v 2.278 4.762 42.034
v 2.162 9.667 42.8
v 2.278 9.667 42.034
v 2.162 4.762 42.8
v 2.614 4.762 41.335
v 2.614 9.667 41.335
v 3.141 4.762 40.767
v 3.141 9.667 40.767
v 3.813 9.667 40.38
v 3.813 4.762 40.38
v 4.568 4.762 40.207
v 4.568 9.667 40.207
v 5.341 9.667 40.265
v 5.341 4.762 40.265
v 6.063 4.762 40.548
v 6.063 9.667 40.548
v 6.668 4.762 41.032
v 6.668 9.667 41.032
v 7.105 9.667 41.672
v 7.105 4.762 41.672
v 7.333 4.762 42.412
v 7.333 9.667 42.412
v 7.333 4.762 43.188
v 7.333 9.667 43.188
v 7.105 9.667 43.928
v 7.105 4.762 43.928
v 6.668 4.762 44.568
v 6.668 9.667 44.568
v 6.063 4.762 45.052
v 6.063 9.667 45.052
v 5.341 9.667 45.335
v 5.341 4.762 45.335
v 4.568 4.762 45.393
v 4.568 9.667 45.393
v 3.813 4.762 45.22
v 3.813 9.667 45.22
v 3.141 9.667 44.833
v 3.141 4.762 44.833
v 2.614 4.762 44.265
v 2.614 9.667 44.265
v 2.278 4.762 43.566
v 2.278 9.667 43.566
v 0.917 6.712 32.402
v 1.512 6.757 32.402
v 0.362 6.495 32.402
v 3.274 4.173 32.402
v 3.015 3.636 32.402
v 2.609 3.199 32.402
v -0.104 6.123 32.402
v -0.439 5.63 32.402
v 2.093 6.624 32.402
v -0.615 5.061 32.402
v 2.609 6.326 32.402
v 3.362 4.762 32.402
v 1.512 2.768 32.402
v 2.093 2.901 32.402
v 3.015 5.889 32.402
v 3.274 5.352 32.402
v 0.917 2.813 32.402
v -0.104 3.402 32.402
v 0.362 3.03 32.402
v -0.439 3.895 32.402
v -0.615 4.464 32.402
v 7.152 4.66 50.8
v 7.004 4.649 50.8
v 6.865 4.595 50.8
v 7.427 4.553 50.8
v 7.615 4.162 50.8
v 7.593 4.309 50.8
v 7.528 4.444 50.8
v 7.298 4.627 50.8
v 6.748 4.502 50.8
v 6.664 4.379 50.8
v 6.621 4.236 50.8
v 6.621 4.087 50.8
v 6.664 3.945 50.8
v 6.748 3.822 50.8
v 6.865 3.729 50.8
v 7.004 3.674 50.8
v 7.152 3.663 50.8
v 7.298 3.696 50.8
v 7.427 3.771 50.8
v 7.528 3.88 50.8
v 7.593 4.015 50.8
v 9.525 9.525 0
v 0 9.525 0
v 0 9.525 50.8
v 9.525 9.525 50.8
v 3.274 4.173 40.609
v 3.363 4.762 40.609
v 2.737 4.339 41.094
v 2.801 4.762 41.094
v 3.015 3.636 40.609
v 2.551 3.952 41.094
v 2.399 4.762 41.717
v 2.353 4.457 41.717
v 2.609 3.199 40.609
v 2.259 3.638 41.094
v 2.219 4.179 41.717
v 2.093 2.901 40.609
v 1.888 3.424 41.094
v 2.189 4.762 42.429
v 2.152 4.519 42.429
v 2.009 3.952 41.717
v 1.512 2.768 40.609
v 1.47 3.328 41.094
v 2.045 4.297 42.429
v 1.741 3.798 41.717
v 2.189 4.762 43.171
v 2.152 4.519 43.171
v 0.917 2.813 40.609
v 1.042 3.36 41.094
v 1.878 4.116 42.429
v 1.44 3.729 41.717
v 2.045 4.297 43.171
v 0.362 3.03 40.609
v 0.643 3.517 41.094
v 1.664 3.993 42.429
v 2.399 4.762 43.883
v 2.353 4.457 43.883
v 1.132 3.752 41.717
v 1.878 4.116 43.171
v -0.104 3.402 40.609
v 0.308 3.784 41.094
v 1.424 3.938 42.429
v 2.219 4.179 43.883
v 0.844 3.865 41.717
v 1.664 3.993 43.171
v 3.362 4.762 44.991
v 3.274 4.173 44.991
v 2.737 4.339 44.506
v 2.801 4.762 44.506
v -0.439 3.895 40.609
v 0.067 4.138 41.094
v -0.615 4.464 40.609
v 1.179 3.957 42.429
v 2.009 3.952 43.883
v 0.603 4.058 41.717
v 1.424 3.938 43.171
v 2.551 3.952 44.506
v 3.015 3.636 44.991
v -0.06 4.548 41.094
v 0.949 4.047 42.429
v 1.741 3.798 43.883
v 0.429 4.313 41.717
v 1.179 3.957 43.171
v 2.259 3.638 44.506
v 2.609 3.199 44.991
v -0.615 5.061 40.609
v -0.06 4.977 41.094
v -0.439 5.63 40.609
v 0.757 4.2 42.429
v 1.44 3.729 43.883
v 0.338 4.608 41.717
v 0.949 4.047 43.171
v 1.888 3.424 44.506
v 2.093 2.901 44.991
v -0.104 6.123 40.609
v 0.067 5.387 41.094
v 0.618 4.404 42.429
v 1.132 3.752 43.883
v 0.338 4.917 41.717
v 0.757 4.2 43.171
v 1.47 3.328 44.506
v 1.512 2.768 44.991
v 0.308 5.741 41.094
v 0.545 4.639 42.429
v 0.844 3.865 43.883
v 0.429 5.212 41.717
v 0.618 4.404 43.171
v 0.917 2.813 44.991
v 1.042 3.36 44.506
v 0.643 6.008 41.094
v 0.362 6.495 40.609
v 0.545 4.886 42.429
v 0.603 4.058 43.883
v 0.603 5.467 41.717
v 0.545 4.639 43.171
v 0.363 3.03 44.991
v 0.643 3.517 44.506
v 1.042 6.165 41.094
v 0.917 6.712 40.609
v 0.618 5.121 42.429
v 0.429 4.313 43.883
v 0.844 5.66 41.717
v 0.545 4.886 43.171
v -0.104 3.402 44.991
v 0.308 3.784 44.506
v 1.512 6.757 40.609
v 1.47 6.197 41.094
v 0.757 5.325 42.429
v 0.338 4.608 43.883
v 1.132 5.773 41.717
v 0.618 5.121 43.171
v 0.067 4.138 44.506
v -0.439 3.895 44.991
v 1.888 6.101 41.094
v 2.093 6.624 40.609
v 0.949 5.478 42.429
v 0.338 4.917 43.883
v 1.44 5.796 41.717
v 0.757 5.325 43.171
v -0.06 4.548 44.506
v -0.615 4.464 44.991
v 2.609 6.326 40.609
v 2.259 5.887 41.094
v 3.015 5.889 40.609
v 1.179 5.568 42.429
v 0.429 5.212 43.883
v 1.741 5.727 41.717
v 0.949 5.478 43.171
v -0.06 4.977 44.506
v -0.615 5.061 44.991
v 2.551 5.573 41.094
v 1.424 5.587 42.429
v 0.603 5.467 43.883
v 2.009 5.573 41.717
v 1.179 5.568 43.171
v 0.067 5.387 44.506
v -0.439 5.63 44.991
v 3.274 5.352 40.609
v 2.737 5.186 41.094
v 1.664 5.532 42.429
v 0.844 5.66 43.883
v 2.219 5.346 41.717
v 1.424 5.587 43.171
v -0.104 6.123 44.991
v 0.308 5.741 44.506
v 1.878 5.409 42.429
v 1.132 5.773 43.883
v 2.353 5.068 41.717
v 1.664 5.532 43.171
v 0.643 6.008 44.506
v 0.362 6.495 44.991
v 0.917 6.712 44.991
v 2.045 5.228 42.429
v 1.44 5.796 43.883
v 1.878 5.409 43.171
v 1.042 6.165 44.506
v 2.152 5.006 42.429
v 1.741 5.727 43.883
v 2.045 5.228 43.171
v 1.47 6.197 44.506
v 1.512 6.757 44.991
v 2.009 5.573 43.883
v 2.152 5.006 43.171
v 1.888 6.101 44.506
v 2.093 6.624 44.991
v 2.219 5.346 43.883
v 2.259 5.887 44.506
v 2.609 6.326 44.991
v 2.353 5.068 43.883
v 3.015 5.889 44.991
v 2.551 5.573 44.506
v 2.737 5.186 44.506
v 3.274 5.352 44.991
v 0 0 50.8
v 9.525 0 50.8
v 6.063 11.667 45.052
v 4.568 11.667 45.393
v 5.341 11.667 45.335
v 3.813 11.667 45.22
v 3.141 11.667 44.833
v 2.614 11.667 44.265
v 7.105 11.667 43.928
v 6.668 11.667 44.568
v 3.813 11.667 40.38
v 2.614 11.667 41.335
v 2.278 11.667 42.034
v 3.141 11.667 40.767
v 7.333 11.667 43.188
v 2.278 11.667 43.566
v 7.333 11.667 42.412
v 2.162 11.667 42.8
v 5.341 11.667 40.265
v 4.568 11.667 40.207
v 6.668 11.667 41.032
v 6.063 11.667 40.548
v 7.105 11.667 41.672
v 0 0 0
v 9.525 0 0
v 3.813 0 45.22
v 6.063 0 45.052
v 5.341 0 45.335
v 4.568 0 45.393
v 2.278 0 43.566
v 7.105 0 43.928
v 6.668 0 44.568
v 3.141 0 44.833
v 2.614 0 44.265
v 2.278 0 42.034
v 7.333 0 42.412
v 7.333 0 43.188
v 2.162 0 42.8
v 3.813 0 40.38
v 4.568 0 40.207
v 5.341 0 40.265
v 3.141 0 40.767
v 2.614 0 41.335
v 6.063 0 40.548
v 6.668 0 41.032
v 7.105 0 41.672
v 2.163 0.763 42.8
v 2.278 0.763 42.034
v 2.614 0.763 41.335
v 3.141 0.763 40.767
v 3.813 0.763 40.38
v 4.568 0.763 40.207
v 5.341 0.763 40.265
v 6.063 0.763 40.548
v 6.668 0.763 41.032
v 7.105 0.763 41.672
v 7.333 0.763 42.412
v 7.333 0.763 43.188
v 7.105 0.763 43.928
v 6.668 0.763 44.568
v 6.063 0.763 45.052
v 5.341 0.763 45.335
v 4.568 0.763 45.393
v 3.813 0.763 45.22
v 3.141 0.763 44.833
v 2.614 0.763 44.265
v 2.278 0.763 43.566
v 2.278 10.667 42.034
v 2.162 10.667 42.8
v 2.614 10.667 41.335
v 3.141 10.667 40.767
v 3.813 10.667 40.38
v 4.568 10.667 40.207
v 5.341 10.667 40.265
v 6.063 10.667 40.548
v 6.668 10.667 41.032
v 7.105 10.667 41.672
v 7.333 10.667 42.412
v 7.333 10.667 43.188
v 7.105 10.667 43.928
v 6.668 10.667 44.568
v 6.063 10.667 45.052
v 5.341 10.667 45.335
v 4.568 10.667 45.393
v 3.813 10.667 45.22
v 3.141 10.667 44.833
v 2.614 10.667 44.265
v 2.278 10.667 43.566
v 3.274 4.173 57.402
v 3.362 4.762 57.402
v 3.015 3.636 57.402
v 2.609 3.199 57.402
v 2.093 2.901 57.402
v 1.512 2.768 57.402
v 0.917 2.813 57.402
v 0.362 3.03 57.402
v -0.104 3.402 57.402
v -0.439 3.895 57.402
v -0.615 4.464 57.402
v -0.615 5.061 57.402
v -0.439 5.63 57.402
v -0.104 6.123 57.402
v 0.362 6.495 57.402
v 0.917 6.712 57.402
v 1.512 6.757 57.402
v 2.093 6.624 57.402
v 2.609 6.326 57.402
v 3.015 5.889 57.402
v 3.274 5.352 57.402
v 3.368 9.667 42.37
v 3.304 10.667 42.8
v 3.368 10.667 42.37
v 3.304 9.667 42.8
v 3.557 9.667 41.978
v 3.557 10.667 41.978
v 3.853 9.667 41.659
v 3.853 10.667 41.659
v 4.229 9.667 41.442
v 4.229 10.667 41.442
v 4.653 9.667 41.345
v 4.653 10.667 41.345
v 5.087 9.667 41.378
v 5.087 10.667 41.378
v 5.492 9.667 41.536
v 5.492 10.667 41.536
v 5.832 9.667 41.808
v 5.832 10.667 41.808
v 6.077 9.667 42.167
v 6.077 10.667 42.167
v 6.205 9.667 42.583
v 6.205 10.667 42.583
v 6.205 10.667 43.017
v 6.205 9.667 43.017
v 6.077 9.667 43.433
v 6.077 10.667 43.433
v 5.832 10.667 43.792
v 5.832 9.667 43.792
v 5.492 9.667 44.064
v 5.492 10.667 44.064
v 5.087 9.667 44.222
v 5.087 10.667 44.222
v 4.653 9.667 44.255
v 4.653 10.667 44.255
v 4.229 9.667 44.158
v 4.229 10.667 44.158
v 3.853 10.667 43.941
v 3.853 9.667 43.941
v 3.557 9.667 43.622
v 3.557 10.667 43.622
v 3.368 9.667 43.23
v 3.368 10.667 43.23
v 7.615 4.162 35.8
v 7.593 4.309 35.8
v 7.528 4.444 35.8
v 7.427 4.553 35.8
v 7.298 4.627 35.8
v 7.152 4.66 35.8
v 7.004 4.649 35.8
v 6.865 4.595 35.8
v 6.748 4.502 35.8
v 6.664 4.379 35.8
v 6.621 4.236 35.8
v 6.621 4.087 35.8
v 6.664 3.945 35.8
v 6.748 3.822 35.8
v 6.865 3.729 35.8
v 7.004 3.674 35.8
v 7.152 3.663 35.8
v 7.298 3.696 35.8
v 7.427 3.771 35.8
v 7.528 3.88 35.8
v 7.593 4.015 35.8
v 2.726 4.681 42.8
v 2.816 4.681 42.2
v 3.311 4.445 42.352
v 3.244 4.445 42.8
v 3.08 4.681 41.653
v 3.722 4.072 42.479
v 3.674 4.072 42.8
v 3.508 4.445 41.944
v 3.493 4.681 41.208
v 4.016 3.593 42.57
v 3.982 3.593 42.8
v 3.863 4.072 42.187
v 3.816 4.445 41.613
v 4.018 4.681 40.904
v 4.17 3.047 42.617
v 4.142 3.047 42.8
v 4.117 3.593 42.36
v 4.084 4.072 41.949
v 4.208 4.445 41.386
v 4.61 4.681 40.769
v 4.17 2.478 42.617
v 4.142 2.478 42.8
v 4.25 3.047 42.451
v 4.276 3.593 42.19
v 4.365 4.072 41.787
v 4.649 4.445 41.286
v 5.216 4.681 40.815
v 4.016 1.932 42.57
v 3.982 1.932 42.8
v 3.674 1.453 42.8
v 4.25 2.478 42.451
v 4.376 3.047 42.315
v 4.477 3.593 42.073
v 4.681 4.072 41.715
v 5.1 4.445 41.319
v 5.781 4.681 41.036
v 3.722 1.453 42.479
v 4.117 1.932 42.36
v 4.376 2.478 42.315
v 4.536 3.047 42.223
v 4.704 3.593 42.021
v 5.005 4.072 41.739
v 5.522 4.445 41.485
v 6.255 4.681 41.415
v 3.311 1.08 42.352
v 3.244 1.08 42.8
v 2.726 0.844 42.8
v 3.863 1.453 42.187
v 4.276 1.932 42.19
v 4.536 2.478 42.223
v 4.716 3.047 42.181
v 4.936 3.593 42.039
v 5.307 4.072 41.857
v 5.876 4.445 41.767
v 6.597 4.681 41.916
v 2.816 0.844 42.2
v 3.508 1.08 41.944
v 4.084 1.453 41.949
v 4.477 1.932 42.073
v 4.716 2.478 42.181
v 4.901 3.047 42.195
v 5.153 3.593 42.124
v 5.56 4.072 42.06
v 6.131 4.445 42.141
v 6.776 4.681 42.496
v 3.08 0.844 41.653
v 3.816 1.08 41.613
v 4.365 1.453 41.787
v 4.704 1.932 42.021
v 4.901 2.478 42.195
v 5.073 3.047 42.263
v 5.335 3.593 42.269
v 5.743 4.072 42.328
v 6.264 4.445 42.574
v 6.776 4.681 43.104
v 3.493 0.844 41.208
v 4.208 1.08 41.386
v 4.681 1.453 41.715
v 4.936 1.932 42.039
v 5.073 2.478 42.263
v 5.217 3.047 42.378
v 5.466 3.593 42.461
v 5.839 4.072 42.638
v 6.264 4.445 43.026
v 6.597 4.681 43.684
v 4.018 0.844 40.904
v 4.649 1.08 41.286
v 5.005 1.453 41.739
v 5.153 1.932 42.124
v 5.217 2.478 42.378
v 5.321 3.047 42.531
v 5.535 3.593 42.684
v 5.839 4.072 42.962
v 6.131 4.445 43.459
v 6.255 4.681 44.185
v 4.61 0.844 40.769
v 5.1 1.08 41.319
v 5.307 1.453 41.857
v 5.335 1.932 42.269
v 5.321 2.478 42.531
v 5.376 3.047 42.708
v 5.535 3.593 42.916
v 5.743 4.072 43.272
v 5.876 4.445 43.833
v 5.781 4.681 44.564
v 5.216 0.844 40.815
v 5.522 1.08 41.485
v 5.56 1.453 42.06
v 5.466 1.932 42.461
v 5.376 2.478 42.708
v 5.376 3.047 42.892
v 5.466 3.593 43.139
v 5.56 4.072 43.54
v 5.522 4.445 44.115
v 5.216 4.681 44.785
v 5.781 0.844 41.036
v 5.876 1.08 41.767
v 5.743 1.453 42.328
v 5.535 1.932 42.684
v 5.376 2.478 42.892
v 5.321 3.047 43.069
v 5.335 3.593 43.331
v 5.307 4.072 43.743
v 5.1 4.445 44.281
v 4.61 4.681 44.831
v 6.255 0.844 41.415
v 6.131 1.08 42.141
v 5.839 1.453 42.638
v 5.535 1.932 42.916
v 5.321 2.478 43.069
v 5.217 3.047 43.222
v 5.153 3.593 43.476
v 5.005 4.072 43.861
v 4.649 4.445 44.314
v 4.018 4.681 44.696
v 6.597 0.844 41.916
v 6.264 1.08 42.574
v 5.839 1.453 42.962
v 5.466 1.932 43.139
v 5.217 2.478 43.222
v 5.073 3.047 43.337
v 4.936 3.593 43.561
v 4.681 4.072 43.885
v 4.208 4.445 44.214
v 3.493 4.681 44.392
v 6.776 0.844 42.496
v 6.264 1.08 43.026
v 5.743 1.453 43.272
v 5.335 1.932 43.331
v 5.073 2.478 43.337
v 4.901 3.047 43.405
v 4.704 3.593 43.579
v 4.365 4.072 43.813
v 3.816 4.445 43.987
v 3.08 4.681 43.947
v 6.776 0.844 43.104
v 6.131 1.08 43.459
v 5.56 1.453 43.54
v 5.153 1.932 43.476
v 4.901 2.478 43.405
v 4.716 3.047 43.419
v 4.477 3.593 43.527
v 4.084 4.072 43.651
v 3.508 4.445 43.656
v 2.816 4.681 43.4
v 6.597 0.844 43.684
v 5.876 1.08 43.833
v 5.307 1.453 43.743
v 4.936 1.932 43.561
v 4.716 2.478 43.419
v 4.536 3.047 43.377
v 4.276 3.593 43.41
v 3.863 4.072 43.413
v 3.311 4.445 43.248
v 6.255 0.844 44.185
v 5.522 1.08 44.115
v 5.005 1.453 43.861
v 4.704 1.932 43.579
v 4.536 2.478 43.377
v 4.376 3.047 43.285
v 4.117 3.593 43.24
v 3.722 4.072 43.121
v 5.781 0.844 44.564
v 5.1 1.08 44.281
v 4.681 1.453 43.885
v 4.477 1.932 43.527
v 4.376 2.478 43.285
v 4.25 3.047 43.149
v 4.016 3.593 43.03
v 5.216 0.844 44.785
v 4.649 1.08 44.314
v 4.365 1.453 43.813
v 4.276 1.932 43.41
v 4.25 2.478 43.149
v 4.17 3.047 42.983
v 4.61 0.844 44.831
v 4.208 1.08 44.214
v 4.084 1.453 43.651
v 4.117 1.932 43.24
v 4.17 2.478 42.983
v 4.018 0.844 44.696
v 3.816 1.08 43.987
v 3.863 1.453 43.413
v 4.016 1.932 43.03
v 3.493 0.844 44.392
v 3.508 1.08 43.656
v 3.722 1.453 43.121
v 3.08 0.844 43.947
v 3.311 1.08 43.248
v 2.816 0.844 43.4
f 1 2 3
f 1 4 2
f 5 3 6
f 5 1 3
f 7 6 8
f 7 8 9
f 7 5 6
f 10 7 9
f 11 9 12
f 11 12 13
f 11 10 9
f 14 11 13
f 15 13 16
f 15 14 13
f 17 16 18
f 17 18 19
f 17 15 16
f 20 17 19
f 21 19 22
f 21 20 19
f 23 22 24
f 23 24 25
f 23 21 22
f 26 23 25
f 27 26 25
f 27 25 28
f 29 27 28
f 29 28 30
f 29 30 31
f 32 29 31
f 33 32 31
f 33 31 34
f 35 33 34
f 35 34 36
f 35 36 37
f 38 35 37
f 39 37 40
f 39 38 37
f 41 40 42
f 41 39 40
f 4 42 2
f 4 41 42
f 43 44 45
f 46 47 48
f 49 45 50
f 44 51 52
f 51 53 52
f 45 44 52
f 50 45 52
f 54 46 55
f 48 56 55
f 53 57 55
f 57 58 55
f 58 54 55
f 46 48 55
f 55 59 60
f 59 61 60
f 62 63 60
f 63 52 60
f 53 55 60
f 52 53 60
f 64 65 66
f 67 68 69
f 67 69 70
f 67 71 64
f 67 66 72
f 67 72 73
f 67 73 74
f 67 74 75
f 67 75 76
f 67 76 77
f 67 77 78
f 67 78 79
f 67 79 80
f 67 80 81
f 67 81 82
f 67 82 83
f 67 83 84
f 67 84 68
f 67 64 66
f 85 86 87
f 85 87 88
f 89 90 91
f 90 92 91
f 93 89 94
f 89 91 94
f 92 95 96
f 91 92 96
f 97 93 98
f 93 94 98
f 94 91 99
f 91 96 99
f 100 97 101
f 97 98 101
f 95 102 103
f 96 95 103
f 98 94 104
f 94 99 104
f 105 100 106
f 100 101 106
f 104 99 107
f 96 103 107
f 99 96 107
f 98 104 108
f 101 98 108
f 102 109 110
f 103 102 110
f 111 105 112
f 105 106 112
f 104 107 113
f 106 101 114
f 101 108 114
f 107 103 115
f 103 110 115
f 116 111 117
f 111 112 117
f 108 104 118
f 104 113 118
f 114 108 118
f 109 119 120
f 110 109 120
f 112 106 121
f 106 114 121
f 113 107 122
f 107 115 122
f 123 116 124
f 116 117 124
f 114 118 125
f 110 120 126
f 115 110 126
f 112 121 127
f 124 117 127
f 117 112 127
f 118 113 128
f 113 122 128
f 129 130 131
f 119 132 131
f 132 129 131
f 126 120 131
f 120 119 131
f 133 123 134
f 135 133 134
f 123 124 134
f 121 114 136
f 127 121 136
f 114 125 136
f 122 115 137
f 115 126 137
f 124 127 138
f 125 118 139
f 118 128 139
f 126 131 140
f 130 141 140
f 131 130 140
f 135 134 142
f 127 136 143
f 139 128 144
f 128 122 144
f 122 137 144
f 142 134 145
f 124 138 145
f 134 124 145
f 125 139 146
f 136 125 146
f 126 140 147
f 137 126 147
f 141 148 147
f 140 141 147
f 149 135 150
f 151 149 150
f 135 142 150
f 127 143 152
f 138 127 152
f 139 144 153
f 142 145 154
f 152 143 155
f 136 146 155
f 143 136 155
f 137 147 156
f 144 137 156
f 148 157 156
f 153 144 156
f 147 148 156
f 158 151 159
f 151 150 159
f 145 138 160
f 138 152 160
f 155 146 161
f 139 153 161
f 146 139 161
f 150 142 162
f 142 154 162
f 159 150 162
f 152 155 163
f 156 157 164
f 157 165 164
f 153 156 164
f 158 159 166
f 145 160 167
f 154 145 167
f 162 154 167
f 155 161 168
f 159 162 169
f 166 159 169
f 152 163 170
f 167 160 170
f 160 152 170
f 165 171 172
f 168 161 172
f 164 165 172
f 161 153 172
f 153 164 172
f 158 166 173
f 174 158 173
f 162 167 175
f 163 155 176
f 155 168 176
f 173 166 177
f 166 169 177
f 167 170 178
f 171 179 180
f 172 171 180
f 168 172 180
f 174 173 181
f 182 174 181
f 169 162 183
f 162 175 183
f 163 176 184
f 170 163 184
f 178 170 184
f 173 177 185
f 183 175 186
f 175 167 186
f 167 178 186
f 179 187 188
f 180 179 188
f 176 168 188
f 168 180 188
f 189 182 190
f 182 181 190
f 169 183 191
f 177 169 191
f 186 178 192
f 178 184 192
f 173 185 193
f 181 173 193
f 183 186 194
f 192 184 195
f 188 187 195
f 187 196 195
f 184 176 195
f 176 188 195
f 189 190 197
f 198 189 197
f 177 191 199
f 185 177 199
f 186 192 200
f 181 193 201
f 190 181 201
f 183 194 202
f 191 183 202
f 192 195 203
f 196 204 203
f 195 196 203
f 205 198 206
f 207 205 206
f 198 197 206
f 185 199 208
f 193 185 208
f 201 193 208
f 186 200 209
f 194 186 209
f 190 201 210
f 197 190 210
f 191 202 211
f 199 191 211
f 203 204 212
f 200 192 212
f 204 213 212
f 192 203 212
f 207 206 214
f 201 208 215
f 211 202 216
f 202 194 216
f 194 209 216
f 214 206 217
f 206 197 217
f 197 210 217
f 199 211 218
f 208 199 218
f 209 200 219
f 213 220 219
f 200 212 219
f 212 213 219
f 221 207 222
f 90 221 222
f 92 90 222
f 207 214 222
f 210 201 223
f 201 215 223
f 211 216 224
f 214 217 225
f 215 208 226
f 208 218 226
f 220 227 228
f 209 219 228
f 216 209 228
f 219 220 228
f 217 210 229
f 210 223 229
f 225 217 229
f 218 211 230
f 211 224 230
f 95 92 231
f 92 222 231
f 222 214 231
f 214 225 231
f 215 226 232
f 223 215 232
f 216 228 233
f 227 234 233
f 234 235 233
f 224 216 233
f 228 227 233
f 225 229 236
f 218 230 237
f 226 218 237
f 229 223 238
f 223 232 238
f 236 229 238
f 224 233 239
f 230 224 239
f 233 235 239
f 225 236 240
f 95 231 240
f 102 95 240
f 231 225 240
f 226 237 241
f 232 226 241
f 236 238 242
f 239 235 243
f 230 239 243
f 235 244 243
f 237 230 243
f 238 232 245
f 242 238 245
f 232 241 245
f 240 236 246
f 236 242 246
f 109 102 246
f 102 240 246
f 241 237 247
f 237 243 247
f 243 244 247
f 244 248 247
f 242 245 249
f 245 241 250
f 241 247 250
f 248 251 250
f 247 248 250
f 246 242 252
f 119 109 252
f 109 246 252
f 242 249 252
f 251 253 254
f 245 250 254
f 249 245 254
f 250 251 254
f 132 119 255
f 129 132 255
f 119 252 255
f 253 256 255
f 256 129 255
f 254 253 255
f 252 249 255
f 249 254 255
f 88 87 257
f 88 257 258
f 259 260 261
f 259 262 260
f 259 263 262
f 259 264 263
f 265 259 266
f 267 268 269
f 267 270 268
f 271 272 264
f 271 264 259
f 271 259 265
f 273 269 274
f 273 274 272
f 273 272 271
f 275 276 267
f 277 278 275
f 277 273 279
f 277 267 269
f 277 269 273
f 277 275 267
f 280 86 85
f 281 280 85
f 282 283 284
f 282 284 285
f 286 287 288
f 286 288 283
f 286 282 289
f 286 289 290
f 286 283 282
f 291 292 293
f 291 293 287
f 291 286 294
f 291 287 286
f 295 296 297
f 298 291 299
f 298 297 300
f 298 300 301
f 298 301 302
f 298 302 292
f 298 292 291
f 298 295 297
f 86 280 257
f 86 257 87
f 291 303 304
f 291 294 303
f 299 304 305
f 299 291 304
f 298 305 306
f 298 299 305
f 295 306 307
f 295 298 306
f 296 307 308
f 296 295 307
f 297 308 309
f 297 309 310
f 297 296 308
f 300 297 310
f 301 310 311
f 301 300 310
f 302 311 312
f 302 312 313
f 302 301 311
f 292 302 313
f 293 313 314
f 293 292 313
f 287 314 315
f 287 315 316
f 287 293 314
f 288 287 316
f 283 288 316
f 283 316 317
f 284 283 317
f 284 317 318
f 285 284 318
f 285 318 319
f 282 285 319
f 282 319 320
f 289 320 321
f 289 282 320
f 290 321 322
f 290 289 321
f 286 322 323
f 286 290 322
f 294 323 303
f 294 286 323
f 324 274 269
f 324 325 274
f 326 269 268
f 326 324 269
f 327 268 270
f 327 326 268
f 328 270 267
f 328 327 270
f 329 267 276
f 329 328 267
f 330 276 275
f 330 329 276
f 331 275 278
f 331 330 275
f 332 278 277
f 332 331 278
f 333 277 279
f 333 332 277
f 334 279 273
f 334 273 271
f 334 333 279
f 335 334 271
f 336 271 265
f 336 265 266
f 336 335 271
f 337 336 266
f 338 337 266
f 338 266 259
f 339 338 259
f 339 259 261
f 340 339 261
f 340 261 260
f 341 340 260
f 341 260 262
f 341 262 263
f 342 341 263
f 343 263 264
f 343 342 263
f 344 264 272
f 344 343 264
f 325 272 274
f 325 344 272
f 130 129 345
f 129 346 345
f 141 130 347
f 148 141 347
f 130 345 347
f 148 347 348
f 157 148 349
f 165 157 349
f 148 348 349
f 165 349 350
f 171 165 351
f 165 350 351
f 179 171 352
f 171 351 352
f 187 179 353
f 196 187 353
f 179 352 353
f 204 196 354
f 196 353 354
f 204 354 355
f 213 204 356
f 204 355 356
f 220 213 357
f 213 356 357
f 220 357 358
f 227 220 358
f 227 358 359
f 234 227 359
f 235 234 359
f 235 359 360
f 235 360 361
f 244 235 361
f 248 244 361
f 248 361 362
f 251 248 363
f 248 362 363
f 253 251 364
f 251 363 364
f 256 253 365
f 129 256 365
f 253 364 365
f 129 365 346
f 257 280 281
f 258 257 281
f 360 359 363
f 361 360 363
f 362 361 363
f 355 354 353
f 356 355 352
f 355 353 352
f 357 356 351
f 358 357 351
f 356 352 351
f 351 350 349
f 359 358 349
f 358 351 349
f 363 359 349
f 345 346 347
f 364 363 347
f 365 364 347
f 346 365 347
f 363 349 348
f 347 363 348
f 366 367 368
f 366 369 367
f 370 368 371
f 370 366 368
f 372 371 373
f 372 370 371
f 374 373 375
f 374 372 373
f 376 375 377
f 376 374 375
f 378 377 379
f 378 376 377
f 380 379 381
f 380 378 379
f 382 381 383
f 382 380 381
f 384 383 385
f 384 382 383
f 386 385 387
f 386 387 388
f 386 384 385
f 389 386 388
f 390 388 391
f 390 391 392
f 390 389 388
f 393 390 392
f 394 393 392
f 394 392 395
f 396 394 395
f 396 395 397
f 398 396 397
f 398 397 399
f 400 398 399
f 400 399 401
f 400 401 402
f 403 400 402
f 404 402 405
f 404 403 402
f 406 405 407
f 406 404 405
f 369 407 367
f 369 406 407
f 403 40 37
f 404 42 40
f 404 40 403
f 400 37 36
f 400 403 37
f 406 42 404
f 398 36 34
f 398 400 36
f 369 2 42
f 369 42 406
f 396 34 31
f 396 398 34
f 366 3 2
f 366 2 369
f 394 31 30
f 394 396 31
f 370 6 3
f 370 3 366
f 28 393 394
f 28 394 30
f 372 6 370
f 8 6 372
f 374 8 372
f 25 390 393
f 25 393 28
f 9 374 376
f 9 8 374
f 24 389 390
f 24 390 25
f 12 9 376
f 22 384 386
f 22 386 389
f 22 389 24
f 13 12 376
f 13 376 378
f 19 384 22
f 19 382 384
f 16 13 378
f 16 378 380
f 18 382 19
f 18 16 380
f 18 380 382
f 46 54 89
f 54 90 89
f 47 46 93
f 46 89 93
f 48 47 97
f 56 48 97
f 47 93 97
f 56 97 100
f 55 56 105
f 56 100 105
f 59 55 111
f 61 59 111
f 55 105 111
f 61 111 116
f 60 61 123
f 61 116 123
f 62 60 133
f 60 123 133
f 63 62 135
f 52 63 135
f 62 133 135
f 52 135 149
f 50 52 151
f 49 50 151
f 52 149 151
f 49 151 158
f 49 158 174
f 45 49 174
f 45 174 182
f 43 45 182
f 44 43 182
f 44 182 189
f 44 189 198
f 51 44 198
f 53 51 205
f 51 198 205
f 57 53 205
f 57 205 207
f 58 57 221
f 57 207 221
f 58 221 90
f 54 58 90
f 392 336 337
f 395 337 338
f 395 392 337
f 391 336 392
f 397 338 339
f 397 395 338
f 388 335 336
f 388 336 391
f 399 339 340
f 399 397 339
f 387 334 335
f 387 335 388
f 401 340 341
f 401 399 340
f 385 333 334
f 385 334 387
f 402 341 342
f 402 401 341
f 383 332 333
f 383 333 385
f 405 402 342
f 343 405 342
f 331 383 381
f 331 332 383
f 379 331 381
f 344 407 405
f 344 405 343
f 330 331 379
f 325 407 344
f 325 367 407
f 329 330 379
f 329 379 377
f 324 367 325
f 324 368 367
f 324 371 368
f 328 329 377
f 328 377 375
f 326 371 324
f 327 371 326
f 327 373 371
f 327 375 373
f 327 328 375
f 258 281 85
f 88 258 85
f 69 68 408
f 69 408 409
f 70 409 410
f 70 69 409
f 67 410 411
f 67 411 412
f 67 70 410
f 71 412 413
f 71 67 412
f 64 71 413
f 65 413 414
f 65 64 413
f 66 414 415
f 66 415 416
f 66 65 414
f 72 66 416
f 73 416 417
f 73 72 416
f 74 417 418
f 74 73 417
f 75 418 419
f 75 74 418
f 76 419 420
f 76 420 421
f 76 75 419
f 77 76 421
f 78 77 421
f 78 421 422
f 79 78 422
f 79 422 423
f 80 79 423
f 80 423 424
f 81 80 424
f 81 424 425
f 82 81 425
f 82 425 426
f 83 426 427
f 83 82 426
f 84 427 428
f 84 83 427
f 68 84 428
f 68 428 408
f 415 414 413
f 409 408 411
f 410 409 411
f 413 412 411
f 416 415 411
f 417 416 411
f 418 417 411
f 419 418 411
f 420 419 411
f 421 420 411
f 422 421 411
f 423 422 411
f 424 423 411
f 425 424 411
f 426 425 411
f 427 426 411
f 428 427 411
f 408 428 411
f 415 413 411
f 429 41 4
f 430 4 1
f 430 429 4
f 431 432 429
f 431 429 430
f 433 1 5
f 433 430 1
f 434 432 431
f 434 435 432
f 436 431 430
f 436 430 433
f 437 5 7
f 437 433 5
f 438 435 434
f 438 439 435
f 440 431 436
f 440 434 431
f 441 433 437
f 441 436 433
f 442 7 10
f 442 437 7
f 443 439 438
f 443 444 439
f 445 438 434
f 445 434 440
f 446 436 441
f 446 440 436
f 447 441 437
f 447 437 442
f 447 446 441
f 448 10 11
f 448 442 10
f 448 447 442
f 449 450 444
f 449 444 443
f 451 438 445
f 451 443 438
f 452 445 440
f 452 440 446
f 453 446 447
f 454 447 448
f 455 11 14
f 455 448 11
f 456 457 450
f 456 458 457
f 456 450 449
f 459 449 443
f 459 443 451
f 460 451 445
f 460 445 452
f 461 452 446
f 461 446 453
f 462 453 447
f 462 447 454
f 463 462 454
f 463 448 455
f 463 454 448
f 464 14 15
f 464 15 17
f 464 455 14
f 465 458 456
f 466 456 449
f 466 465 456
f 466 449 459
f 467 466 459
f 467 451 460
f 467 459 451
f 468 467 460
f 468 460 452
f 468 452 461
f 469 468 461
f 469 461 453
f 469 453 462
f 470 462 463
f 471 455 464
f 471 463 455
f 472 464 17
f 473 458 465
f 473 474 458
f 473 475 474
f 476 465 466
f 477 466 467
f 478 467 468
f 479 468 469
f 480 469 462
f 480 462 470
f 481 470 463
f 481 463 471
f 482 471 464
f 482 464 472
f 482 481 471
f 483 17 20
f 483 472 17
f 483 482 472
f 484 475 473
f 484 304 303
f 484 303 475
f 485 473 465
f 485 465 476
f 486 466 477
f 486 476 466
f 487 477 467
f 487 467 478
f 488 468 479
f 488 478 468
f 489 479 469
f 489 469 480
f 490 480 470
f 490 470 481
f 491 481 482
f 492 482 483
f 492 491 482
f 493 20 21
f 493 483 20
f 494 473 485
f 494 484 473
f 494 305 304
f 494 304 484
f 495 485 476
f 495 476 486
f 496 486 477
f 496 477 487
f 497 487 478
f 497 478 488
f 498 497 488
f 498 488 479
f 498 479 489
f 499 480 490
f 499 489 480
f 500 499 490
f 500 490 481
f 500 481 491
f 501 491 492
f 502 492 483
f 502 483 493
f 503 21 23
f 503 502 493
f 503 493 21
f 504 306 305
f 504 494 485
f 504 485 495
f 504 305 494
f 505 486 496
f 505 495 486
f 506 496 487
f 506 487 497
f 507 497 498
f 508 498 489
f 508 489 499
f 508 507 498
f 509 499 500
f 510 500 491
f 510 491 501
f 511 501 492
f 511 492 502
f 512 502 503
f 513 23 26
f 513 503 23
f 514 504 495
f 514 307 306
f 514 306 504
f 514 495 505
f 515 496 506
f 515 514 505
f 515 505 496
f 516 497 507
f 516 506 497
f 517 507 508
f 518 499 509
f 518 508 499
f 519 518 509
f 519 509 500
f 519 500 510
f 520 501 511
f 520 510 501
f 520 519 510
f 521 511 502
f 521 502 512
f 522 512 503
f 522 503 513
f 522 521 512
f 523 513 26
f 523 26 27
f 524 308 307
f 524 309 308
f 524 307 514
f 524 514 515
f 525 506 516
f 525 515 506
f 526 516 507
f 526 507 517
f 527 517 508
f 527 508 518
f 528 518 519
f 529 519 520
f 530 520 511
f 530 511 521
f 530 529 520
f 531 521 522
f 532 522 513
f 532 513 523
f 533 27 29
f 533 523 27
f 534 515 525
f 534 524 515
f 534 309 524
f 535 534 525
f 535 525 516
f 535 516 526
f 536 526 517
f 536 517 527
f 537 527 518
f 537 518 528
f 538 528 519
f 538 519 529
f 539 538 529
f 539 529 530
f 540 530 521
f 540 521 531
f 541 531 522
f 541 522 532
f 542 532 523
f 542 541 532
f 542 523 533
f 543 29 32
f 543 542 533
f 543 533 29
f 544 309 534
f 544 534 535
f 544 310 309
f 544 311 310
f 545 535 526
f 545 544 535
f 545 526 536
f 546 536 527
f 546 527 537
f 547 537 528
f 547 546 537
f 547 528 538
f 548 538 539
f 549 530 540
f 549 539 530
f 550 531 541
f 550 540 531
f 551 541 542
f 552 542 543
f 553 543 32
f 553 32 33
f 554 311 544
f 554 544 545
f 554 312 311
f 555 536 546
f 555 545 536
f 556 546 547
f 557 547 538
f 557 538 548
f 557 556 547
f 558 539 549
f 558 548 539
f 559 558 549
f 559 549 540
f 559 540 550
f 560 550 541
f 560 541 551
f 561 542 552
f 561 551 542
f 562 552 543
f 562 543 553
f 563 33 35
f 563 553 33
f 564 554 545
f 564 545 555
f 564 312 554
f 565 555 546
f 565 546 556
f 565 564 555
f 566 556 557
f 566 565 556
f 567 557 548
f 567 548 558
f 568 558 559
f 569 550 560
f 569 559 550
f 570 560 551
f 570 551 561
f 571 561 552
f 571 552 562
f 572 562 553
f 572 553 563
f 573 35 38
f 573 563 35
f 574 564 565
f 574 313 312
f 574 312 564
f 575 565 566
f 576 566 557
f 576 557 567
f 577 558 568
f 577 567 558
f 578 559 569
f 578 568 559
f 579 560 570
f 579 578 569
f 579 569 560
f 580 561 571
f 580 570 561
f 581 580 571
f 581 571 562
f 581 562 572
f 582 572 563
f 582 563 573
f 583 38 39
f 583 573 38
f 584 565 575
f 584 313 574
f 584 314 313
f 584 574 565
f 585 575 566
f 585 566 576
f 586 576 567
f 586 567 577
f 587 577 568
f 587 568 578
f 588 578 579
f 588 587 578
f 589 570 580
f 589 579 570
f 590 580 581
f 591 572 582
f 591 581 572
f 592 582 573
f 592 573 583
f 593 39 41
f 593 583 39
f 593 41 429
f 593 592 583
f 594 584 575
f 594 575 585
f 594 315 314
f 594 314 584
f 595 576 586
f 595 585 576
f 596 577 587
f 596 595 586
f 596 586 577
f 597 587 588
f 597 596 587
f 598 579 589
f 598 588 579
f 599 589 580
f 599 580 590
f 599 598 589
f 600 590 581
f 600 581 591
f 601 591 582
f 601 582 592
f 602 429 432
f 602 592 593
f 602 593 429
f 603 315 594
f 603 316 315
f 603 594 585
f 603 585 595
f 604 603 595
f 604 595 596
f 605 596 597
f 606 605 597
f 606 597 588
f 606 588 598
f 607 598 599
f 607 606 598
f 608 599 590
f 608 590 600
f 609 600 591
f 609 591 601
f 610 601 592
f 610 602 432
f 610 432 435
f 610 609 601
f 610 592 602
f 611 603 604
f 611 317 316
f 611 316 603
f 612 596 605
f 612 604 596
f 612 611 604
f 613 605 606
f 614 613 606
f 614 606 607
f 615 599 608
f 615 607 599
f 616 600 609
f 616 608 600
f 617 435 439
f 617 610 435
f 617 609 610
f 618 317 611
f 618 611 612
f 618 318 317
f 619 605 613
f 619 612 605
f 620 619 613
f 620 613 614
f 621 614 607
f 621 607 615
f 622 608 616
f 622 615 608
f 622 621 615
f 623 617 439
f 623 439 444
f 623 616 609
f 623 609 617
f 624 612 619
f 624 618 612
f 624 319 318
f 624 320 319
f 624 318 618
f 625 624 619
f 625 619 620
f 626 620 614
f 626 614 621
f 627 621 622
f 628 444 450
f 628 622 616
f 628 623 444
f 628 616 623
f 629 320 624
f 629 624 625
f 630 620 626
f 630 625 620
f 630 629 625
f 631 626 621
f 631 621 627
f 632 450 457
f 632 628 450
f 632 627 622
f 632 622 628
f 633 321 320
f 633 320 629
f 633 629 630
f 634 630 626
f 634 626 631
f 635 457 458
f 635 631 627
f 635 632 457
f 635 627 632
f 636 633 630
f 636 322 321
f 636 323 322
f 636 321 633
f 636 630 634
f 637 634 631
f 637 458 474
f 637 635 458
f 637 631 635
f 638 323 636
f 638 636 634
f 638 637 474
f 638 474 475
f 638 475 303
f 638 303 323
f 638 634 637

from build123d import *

# Parameters (mm, degrees)
F0_W      = 9.525
F0_H      = 9.525
F1_DEPTH  = 50.8
F11_R     = 0.5
F12_DEPTH = 15


with BuildPart() as f1:
    # F0 (on Top) → F1 (new body)
    with BuildSketch(Plane.XY):
        with Locations((4.7625, 4.7625)):
            Rectangle(F0_W, F0_H)
    extrude(amount=F1_DEPTH)


with BuildPart() as f4:
    # F3 (on offset) → F4 (revolve)
    with BuildSketch(Plane.XY.offset(42.8)):
        with BuildLine():
            Line((4.7625, 11.6668619663), (2.1625, 11.6668619663))
            Line((2.1625, 11.6668619663), (2.1625, 10.6668619663))
            Line((2.1625, 10.6668619663), (3.303514332, 10.6668619663))
            Line((3.303514332, 10.6668619663), (3.303514332, 9.6668619663))
            Line((3.303514332, 9.6668619663), (2.1625, 9.6668619663))
            Line((2.1625, 9.6668619663), (2.1625, 4.7625))
            ThreePointArc((2.1625, 4.7625), (4.1625, 2.7625), (2.1625, 0.7625))
            Line((2.1625, 0.7625), (2.1625, 0))
            Line((2.1625, 0), (4.7625, 0))
            Line((4.7625, 0), (4.7625, 11.6668619663))
        make_face()
    revolve(axis=Axis((4.7625, 4.0530543774, 42.8), (0, -1, 0)))


with BuildPart() as f10:
    # F9 (on 3pt) → F10 (revolve)
    with BuildSketch(Plane.XZ.offset(-4.7625)):
        with BuildLine():
            Line((3.3625, 57.4017606624), (1.3625, 57.4017606624))
            Line((1.3625, 57.4017606624), (1.3625, 32.4017606624))
            Line((1.3625, 32.4017606624), (3.3625, 32.4017606624))
            Line((3.3625, 32.4017606624), (3.3625, 40.60910977))
            ThreePointArc((3.3625, 40.60910977), (2.1625, 42.8), (3.3625, 44.99089023))
            Line((3.3625, 44.99089023), (3.3625, 57.4017606624))
        make_face()
    revolve(axis=Axis((1.3625, 4.7625, 45.4864110798), (0, 0, -1)))


with BuildPart() as f12:
    # F11 (on face) → F12 (new body)
    with BuildSketch(Plane.XY.offset(50.8)):
        with Locations((7.1149454452, 4.1618831456)):
            Circle(F11_R)
    extrude(amount=-F12_DEPTH)


solid = Compound([f1.part, f4.part, f10.part, f12.part])
